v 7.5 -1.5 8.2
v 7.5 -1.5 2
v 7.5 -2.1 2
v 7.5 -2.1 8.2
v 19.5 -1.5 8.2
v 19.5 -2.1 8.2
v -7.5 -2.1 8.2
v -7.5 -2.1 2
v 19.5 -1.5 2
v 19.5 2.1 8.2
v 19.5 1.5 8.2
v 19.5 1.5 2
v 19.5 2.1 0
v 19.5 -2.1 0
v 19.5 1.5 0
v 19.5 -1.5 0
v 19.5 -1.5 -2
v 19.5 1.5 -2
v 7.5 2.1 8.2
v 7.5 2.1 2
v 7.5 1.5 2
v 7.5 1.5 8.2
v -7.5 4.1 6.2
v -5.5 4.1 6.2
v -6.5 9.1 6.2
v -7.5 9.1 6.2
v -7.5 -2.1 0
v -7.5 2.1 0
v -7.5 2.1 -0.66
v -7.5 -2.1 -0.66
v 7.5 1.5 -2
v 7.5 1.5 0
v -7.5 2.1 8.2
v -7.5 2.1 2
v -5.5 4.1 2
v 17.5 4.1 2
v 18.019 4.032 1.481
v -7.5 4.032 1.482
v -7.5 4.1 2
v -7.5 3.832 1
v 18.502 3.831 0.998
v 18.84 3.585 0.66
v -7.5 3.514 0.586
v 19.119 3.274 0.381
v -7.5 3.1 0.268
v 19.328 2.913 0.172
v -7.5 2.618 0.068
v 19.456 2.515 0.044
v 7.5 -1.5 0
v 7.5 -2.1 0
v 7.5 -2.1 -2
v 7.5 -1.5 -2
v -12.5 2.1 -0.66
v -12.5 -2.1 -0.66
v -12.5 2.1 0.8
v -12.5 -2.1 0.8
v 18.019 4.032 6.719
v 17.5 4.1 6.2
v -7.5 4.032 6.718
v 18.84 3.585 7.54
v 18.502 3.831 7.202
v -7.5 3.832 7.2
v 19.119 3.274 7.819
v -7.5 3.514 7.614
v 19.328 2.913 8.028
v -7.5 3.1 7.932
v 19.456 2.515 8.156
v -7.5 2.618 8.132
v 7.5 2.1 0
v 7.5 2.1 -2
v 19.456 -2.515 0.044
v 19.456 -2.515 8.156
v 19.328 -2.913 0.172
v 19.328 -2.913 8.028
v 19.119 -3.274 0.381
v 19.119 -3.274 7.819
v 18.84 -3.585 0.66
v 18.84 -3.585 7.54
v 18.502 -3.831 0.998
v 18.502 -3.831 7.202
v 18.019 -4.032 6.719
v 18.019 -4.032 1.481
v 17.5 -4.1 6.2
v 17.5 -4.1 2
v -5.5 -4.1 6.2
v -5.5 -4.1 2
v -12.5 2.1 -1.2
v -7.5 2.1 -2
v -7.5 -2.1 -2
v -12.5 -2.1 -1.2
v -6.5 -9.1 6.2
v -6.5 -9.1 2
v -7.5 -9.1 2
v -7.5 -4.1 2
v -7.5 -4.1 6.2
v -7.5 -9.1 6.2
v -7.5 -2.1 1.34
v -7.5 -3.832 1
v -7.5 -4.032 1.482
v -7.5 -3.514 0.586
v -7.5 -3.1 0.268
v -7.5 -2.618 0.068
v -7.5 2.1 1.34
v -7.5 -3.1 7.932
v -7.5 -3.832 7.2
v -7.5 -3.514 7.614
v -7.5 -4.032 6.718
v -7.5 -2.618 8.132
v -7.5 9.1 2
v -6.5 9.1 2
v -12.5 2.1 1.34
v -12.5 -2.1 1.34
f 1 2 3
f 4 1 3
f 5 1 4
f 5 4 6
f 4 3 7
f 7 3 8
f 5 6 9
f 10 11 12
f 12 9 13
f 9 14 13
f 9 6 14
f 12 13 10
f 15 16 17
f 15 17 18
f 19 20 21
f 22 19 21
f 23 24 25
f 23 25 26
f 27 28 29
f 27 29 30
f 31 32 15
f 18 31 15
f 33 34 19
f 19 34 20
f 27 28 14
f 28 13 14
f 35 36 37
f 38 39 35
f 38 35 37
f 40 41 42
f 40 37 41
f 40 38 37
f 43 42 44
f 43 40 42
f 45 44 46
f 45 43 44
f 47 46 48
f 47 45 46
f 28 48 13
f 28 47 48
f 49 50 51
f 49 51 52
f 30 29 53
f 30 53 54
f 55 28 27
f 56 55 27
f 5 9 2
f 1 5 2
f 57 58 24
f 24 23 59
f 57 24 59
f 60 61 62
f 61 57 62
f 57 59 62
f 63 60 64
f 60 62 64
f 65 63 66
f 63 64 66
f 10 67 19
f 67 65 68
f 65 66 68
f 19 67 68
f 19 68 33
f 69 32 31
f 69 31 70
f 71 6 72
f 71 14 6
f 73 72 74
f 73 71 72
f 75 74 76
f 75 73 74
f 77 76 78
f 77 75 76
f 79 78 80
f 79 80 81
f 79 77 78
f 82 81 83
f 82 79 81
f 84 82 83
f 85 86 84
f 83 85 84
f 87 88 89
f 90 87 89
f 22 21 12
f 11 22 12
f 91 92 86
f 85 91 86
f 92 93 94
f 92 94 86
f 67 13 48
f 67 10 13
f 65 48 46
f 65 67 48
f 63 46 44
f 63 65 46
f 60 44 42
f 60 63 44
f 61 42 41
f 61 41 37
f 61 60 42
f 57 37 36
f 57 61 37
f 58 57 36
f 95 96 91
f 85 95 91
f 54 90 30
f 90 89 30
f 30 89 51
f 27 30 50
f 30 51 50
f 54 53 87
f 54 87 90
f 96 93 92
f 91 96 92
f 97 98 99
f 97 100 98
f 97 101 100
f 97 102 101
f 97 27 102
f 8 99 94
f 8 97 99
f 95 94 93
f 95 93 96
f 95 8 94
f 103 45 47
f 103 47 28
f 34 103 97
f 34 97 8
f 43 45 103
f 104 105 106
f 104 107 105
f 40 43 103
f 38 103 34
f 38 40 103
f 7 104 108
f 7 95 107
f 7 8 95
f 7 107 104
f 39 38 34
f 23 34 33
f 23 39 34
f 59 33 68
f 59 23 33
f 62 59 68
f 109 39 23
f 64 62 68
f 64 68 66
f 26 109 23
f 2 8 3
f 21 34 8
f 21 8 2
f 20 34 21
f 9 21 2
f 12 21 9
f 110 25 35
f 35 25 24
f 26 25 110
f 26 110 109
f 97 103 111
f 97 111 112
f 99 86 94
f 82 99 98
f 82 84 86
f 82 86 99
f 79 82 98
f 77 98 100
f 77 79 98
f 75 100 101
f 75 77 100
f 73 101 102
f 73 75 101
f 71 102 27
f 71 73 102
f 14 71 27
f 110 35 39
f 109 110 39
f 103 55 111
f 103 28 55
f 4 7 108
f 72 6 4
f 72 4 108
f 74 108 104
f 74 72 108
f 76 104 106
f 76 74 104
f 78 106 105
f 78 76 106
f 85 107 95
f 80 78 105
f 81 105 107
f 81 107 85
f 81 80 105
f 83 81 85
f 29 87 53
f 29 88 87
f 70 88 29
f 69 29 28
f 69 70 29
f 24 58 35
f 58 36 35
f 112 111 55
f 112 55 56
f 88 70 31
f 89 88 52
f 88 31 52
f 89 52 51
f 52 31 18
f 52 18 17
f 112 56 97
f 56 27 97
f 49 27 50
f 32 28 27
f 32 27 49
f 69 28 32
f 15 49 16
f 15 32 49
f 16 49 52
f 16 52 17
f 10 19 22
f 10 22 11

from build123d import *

# Parameters (mm, degrees)
F0_W         = 12
F0_H         = 3
F1_DEPTH     = 2
F2_DEPTH     = 8.2
F3_R         = 2
F4_DEPTH     = 2
F5_W         = 4.2
F5_H         = 1.34
F6_DEPTH     = 5
F7_W         = 4.2
F7_H         = 1.34
F8_DEPTH     = 5
F9_SIZE2     = 5
F9_SIZE      = 0.8
F9_2_SIZE2   = 5
F9_2_SIZE    = 0.8
F11_W        = 2
F11_H        = 4.2
F12_DEPTH    = 5
F10_W        = 2
F10_H        = 4.2
F13_DEPTH    = 5
F14_T4_DEPTH = 30.181320863
F14_T9_DEPTH = 30.181320863


# Not quite as in the source:
# - a fillet or chamfer that OpenCascade refuses, or shapes differently, is made with other operations: its cross-section is extruded or revolved along the edge and cut away or added
# - two fillets or chamfers of one size are made in one step


with BuildPart() as f1:
    # F0 (on Top) → F1 (new body)
    with BuildSketch(Plane.XY):
        Polygon((7.5, 1.5), (7.5, 2.1), (-7.5, 2.1), (-7.5, -2.1), (7.5, -2.1), (7.5, -1.5), align=None)
        with Locations((13.5, 0)):
            Rectangle(F0_W, F0_H)
        Polygon((-7.5, 2.1), (7.5, 2.1), (7.5, 1.5), (19.5, 1.5), (19.5, 4.1), (-7.5, 4.1), align=None)
        Polygon((7.5, -2.1), (-7.5, -2.1), (-7.5, -4.1), (19.5, -4.1), (19.5, -1.5), (7.5, -1.5), align=None)
    extrude(amount=F1_DEPTH)

    # F0 (on Top) → F2 (join)
    with BuildSketch(Plane.XY):
        Polygon((7.5, -2.1), (-7.5, -2.1), (-7.5, -4.1), (19.5, -4.1), (19.5, -1.5), (7.5, -1.5), align=None)
        Polygon((-7.5, 2.1), (7.5, 2.1), (7.5, 1.5), (19.5, 1.5), (19.5, 4.1), (-7.5, 4.1), align=None)
    extrude(amount=F2_DEPTH)

    # F3
    f3_edges = [f1.edges().sort_by_distance(p)[0] for p in [
        (19.5, -4.1, 4.1),
        (19.5, 4.1, 4.1),
        (6, -4.1, 8.2),
        (6, 4.1, 8.2),
        (6, 4.1, 0),
        (6, -4.1, 0),
    ]]
    fillet(f3_edges, radius=F3_R)

    # F7 (on face) → F8 (join)
    with BuildSketch(Plane(origin=(-7.5, 0, 0), x_dir=(0, -1, 0), z_dir=(-1, 0, 0))):
        with Locations((0, 0.67)):
            Rectangle(F7_W, F7_H)
    extrude(amount=F8_DEPTH)

    # F9#2
    f9_2_edges = [f1.edges().sort_by_distance(p)[0] for p in [
        (-12.5, 0, 0),
    ]]
    f9_2_side = f1.faces().sort_by_distance((-12.5, 0, 0.67))[0]
    chamfer(f9_2_edges, length=F9_2_SIZE, length2=F9_2_SIZE2, reference=f9_2_side)

    # F11 (on face) → F12 (join)
    with BuildSketch(Plane(origin=(0, 4.1, 0), x_dir=(-1, 0, 0), z_dir=(0, 1, 0))):
        with Locations((6.5, 4.1)):
            Rectangle(F11_W, F11_H)
    extrude(amount=F12_DEPTH)

    # F10 (on face) → F13 (join)
    with BuildSketch(Plane.XZ.offset(4.1)):
        with Locations((-6.5, 4.1)):
            Rectangle(F10_W, F10_H)
    extrude(amount=F13_DEPTH)

    # F14: chamfer of 1 x 5 on 2 edges, made by hand


with BuildPart() as f4:
    # F0 (on Top) → F4 (new body)
    with BuildSketch(Plane.XY):
        with Locations((13.5, 0)):
            Rectangle(F0_W, F0_H)
        Polygon((7.5, 1.5), (7.5, 2.1), (-7.5, 2.1), (-7.5, -2.1), (7.5, -2.1), (7.5, -1.5), align=None)
    extrude(amount=-F4_DEPTH)

    # F5 (on face) → F6 (join)
    with BuildSketch(Plane(origin=(-7.5, 0, 0), x_dir=(0, -1, 0), z_dir=(-1, 0, 0))):
        with Locations((0, -1.33)):
            Rectangle(F5_W, F5_H)
    extrude(amount=F6_DEPTH)

    # F9
    f9_edges = [f4.edges().sort_by_distance(p)[0] for p in [
        (-12.5, 0, -2),
    ]]
    f9_side = f4.faces().sort_by_distance((-12.5, 0, -1.33))[0]
    chamfer(f9_edges, length=F9_SIZE, length2=F9_SIZE2, reference=f9_side)


with BuildPart() as f14_tool2:
    # F14_s3 → F14_t4 (new body)
    with BuildSketch(Plane.XY.offset(-10.9906604315)):
        Polygon((-6.5, -9.1), (-5.5, -4.1), (-5.5, -9.1), align=None)
    extrude(amount=F14_T4_DEPTH)

    split(bisect_by=Plane.XZ.offset(4.1), keep=Keep.TOP)


with BuildPart() as f1_1:
    add(f1.part)

    # F14_t1: cut F14_tool2
    add(f14_tool2.part, mode=Mode.SUBTRACT)


with BuildPart() as f14_tool7:
    # F14_s8 → F14_t9 (new body)
    with BuildSketch(Plane.XY.offset(19.1906604315)):
        Polygon((-6.5, 9.1), (-5.5, 4.1), (-5.5, 9.1), align=None)
    extrude(amount=-F14_T9_DEPTH)

    split(bisect_by=Plane.XZ.offset(-4.1), keep=Keep.BOTTOM)


with BuildPart() as f1_2:
    add(f1_1.part)

    # F14_t6: cut F14_tool7
    add(f14_tool7.part, mode=Mode.SUBTRACT)


solid = Compound([f4.part, f1_2.part])
